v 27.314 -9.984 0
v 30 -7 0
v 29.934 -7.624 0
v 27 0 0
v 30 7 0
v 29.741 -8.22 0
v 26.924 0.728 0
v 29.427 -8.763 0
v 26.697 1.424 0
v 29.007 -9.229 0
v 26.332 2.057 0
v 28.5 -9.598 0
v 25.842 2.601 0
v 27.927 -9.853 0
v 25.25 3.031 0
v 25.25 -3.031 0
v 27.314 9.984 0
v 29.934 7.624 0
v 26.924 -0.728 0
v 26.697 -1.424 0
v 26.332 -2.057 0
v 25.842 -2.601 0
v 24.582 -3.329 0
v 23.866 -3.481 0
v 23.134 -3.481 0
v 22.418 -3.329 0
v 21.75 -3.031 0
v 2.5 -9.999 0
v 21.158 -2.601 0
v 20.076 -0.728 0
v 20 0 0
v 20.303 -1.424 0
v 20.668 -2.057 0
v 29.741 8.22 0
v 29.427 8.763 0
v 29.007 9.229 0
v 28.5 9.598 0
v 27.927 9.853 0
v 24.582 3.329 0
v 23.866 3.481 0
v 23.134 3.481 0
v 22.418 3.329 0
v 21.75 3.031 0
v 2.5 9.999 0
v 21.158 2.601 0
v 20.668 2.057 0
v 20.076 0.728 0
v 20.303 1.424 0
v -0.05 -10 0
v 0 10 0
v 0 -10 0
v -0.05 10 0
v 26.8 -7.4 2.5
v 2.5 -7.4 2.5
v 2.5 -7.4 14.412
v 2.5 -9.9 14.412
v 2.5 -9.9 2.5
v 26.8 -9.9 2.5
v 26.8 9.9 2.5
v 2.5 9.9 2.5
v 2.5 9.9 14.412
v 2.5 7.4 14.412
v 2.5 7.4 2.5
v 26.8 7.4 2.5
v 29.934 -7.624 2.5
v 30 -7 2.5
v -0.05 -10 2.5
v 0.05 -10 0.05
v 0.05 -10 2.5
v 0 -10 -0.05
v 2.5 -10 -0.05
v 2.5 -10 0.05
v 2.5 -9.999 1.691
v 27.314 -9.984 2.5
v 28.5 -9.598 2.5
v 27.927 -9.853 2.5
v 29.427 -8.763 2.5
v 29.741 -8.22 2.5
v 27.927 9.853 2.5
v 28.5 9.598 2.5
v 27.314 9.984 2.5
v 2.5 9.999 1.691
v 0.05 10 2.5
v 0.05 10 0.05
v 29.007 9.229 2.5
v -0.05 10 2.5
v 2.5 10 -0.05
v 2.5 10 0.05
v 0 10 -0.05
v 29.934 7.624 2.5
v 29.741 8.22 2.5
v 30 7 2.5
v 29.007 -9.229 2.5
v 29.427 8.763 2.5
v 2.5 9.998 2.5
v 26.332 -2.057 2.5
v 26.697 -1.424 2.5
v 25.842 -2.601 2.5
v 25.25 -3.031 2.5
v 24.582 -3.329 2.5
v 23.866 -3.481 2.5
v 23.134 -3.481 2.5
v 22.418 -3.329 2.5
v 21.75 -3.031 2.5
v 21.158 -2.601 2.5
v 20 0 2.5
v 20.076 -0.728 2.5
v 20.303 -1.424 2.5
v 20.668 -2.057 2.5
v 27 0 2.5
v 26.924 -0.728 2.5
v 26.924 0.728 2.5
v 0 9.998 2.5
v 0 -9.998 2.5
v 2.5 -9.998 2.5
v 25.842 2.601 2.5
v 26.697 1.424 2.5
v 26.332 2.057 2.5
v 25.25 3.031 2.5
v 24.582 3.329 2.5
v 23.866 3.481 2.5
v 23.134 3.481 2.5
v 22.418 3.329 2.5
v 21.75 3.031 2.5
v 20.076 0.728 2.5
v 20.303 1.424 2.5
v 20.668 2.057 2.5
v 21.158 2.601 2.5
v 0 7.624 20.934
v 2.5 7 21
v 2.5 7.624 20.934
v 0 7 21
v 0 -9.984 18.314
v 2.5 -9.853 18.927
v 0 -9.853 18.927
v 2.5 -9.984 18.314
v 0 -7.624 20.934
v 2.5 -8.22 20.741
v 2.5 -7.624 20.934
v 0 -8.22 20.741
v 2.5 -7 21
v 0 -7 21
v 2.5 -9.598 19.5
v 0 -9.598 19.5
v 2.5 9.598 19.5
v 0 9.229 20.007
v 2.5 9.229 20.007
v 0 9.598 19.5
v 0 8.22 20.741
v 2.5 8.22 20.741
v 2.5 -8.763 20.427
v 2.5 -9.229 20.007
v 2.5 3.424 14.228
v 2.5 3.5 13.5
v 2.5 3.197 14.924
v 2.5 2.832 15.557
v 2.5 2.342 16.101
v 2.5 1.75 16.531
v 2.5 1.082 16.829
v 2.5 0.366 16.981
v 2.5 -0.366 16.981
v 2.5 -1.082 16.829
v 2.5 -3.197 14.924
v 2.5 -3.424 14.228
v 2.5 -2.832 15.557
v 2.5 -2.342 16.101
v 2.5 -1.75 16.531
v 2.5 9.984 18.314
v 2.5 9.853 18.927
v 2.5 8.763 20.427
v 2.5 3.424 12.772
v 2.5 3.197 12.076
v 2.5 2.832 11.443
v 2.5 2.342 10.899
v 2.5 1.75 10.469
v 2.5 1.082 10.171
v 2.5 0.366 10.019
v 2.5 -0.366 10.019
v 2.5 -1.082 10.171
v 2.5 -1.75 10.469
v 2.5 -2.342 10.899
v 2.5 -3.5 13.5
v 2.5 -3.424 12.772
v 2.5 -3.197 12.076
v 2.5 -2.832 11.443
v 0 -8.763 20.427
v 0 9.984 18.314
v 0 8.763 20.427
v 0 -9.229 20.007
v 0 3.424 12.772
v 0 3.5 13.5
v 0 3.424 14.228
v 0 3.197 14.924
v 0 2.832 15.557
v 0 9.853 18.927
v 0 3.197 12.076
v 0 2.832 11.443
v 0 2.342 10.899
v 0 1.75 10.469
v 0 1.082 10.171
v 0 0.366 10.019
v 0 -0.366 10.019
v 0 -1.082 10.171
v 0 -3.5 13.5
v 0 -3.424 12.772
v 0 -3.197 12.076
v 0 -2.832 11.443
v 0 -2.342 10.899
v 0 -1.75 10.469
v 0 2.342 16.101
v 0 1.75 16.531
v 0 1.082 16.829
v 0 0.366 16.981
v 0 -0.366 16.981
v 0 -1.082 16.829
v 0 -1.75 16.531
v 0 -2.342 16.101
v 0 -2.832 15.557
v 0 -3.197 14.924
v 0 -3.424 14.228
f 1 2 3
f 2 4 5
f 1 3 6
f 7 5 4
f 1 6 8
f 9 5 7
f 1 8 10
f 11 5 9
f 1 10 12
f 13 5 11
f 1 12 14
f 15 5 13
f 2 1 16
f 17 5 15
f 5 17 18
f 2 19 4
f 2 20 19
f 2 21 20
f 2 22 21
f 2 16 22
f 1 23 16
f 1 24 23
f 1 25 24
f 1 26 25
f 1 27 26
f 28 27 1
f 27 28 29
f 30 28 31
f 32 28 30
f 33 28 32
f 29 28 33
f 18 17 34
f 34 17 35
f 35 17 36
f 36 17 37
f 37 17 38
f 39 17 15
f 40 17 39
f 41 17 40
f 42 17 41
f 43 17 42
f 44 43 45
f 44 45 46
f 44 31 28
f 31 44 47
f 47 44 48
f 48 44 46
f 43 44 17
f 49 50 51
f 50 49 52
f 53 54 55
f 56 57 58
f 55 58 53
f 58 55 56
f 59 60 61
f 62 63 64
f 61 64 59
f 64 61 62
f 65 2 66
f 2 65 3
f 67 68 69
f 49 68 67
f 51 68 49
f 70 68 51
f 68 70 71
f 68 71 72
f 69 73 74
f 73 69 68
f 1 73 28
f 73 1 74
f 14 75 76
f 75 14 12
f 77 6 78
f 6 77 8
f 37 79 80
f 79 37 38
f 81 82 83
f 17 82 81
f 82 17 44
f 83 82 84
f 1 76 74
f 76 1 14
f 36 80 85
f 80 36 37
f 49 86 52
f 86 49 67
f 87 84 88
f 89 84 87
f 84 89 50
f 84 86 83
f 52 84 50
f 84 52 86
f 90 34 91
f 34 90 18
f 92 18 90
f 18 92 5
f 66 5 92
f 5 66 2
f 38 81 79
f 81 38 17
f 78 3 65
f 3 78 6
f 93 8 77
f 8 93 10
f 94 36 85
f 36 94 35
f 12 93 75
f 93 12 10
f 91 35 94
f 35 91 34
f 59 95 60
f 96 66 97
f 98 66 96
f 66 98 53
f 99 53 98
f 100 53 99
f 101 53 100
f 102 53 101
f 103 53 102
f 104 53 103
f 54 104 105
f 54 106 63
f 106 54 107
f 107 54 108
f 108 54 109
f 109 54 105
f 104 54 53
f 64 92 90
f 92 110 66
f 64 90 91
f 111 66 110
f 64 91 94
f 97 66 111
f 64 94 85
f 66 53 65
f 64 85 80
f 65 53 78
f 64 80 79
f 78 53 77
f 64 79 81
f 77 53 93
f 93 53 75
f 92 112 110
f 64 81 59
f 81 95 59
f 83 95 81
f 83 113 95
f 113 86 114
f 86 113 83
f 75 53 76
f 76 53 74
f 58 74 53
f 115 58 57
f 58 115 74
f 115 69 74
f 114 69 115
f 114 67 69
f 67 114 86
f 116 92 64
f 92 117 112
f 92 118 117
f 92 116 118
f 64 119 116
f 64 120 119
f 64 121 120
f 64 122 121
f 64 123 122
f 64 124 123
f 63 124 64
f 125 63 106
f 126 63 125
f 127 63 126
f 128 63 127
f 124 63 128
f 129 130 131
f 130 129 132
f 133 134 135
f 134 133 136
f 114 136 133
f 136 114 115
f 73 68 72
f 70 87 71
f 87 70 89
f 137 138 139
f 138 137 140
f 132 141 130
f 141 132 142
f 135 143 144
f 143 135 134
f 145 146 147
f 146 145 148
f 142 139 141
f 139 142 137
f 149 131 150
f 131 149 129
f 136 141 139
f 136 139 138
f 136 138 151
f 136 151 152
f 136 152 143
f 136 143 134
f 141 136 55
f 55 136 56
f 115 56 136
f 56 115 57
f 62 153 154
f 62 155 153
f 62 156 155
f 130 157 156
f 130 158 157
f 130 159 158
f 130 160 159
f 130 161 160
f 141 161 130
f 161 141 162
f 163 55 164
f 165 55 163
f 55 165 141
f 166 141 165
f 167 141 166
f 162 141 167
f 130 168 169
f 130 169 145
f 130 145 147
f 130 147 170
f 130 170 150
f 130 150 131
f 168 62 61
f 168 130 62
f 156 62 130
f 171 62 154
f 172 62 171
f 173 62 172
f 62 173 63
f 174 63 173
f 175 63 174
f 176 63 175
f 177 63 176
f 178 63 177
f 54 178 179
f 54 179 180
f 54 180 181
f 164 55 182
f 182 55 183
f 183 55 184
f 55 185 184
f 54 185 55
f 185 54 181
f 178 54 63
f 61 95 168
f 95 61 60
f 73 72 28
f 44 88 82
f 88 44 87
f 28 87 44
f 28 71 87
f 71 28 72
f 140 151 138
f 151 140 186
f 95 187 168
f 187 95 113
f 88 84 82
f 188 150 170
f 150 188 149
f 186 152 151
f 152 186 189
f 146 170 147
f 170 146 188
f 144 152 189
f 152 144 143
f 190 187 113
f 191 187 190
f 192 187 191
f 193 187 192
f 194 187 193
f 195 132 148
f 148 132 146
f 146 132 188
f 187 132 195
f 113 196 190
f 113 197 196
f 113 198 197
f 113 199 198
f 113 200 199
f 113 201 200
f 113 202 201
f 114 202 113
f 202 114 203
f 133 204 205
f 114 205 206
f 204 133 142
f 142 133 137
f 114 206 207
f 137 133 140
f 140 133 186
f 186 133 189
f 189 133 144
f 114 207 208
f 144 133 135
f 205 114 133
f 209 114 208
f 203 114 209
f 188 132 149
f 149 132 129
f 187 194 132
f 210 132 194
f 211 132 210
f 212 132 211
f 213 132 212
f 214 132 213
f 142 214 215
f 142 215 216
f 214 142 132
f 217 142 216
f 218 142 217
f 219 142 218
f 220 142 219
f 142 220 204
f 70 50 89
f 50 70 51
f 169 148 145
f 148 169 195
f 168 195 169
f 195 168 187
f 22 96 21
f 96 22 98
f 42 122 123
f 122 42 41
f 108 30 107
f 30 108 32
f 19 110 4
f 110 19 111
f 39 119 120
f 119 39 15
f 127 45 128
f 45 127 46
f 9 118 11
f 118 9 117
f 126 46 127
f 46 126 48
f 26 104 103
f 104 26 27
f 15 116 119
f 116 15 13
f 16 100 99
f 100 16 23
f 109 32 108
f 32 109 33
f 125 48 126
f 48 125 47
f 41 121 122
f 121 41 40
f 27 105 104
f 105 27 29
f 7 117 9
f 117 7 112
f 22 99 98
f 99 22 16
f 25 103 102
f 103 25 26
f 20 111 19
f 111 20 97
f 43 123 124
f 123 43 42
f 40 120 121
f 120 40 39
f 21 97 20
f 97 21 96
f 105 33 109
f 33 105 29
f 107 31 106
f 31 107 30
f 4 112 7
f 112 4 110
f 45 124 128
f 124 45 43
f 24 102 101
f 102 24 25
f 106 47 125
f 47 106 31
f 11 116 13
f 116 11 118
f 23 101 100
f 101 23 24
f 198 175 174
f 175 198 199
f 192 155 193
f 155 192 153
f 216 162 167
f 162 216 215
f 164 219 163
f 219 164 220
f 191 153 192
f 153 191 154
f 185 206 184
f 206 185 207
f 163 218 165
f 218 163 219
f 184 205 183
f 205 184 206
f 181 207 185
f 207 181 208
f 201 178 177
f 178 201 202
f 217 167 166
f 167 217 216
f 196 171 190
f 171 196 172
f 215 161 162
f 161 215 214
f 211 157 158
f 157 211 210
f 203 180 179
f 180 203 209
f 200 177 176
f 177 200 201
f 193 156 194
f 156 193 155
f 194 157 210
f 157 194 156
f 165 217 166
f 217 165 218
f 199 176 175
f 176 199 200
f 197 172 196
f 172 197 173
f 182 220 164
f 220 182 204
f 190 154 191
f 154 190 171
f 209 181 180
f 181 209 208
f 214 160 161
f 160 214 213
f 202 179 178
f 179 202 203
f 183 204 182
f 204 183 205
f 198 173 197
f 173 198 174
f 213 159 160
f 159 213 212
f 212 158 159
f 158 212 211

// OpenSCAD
//********************************************************************
//********************************************************************
//Simple drawer or shelf bracket
//by Marc Sulfridge
//********************************************************************
//********************************************************************

//********************************************************************
//User defined parameters
//********************************************************************
//Width of bracket.
width = 20; // [2:25]
//Lenght of side reinforcement triangles.
side_len = 28; // [5:50]
//Height of side reinforcement triangles.
side_ht = 15; // [5:50]
//Length of horizontal base.
length = 30; // [5:50]
//Height of vertical base.
up_ht = 21; // [5:50]
//Thickness of base and side.
thick = 2.5; // [0.25:2.5]
//Thickness of side reinforcement triangles.
side_thk = 2.5; // [0.25:2.5]
//Radius of corner fillets.
fillet_rad = 3; // [0.5:5]
//Distance between end of horizontal base and center of horizontal hole.
base_hole_gap = 3; // [1:10]
//Distance between top of vertical base and center of vertical hole.
side_hole_gap = 10; // [1:10]
//Short axis (diameter) of screw holes.
hole_dia = 7; // [1:10]
//Long axis (length) of screw holes.
hole_wid = 7; // [2:20]
//Fudge factor to ensure overlaps.
dt = 0.1; // [0.001,0.01,0.1]
//********************************************************************
$fn = 30;
module hole(){
	hull(){
		for (i=[-1,1]){
			translate([0,i*(hole_wid-hole_dia)/2 , -dt/2])
			cylinder(r=hole_dia/2,h=10,center=false);
		}
	}
}

module side(){
	hull(){
		cube([dt,side_thk,side_ht], center=false);

		translate([side_len-thick,0,0])
		cube([dt,side_thk,thick], center=false);
	}
}

module base(long){
	translate([0,0,thick/2])
	hull(){
		cube([dt,width,thick], center=true);
		
		for (i=[-1,1]){
			translate([long-fillet_rad,i*(width/2-fillet_rad),0])
			cylinder(r=fillet_rad,h=thick,center=true);
		}
	}
}

module upright(long){
	translate([thick,0,0])
	rotate([0,-90,0])
	base(long);
}


//%translate([24,0,15])
//	screwSpace();
difference(){
	union(){
		base(length);
		upright(up_ht);
		
		for (i=[-width/2+dt, width/2-side_thk-dt]){
			translate([(thick-3*dt)-1,i,0])
			side();
		}
	}

	translate([length-base_hole_gap-hole_dia/2,0,-2])
	hole();

	translate([thick+2,0,side_hole_gap+hole_wid/2])
	rotate([0,-90,0])
	rotate([0,0,90])
	hole();
}

module screwSpace() {
	minkowski() {
		cylinder(20, d=12, center=true);
		sphere(1);
	}	
	translate([0,0,-10])
		cylinder(20, d=7, center=true);
	
}
